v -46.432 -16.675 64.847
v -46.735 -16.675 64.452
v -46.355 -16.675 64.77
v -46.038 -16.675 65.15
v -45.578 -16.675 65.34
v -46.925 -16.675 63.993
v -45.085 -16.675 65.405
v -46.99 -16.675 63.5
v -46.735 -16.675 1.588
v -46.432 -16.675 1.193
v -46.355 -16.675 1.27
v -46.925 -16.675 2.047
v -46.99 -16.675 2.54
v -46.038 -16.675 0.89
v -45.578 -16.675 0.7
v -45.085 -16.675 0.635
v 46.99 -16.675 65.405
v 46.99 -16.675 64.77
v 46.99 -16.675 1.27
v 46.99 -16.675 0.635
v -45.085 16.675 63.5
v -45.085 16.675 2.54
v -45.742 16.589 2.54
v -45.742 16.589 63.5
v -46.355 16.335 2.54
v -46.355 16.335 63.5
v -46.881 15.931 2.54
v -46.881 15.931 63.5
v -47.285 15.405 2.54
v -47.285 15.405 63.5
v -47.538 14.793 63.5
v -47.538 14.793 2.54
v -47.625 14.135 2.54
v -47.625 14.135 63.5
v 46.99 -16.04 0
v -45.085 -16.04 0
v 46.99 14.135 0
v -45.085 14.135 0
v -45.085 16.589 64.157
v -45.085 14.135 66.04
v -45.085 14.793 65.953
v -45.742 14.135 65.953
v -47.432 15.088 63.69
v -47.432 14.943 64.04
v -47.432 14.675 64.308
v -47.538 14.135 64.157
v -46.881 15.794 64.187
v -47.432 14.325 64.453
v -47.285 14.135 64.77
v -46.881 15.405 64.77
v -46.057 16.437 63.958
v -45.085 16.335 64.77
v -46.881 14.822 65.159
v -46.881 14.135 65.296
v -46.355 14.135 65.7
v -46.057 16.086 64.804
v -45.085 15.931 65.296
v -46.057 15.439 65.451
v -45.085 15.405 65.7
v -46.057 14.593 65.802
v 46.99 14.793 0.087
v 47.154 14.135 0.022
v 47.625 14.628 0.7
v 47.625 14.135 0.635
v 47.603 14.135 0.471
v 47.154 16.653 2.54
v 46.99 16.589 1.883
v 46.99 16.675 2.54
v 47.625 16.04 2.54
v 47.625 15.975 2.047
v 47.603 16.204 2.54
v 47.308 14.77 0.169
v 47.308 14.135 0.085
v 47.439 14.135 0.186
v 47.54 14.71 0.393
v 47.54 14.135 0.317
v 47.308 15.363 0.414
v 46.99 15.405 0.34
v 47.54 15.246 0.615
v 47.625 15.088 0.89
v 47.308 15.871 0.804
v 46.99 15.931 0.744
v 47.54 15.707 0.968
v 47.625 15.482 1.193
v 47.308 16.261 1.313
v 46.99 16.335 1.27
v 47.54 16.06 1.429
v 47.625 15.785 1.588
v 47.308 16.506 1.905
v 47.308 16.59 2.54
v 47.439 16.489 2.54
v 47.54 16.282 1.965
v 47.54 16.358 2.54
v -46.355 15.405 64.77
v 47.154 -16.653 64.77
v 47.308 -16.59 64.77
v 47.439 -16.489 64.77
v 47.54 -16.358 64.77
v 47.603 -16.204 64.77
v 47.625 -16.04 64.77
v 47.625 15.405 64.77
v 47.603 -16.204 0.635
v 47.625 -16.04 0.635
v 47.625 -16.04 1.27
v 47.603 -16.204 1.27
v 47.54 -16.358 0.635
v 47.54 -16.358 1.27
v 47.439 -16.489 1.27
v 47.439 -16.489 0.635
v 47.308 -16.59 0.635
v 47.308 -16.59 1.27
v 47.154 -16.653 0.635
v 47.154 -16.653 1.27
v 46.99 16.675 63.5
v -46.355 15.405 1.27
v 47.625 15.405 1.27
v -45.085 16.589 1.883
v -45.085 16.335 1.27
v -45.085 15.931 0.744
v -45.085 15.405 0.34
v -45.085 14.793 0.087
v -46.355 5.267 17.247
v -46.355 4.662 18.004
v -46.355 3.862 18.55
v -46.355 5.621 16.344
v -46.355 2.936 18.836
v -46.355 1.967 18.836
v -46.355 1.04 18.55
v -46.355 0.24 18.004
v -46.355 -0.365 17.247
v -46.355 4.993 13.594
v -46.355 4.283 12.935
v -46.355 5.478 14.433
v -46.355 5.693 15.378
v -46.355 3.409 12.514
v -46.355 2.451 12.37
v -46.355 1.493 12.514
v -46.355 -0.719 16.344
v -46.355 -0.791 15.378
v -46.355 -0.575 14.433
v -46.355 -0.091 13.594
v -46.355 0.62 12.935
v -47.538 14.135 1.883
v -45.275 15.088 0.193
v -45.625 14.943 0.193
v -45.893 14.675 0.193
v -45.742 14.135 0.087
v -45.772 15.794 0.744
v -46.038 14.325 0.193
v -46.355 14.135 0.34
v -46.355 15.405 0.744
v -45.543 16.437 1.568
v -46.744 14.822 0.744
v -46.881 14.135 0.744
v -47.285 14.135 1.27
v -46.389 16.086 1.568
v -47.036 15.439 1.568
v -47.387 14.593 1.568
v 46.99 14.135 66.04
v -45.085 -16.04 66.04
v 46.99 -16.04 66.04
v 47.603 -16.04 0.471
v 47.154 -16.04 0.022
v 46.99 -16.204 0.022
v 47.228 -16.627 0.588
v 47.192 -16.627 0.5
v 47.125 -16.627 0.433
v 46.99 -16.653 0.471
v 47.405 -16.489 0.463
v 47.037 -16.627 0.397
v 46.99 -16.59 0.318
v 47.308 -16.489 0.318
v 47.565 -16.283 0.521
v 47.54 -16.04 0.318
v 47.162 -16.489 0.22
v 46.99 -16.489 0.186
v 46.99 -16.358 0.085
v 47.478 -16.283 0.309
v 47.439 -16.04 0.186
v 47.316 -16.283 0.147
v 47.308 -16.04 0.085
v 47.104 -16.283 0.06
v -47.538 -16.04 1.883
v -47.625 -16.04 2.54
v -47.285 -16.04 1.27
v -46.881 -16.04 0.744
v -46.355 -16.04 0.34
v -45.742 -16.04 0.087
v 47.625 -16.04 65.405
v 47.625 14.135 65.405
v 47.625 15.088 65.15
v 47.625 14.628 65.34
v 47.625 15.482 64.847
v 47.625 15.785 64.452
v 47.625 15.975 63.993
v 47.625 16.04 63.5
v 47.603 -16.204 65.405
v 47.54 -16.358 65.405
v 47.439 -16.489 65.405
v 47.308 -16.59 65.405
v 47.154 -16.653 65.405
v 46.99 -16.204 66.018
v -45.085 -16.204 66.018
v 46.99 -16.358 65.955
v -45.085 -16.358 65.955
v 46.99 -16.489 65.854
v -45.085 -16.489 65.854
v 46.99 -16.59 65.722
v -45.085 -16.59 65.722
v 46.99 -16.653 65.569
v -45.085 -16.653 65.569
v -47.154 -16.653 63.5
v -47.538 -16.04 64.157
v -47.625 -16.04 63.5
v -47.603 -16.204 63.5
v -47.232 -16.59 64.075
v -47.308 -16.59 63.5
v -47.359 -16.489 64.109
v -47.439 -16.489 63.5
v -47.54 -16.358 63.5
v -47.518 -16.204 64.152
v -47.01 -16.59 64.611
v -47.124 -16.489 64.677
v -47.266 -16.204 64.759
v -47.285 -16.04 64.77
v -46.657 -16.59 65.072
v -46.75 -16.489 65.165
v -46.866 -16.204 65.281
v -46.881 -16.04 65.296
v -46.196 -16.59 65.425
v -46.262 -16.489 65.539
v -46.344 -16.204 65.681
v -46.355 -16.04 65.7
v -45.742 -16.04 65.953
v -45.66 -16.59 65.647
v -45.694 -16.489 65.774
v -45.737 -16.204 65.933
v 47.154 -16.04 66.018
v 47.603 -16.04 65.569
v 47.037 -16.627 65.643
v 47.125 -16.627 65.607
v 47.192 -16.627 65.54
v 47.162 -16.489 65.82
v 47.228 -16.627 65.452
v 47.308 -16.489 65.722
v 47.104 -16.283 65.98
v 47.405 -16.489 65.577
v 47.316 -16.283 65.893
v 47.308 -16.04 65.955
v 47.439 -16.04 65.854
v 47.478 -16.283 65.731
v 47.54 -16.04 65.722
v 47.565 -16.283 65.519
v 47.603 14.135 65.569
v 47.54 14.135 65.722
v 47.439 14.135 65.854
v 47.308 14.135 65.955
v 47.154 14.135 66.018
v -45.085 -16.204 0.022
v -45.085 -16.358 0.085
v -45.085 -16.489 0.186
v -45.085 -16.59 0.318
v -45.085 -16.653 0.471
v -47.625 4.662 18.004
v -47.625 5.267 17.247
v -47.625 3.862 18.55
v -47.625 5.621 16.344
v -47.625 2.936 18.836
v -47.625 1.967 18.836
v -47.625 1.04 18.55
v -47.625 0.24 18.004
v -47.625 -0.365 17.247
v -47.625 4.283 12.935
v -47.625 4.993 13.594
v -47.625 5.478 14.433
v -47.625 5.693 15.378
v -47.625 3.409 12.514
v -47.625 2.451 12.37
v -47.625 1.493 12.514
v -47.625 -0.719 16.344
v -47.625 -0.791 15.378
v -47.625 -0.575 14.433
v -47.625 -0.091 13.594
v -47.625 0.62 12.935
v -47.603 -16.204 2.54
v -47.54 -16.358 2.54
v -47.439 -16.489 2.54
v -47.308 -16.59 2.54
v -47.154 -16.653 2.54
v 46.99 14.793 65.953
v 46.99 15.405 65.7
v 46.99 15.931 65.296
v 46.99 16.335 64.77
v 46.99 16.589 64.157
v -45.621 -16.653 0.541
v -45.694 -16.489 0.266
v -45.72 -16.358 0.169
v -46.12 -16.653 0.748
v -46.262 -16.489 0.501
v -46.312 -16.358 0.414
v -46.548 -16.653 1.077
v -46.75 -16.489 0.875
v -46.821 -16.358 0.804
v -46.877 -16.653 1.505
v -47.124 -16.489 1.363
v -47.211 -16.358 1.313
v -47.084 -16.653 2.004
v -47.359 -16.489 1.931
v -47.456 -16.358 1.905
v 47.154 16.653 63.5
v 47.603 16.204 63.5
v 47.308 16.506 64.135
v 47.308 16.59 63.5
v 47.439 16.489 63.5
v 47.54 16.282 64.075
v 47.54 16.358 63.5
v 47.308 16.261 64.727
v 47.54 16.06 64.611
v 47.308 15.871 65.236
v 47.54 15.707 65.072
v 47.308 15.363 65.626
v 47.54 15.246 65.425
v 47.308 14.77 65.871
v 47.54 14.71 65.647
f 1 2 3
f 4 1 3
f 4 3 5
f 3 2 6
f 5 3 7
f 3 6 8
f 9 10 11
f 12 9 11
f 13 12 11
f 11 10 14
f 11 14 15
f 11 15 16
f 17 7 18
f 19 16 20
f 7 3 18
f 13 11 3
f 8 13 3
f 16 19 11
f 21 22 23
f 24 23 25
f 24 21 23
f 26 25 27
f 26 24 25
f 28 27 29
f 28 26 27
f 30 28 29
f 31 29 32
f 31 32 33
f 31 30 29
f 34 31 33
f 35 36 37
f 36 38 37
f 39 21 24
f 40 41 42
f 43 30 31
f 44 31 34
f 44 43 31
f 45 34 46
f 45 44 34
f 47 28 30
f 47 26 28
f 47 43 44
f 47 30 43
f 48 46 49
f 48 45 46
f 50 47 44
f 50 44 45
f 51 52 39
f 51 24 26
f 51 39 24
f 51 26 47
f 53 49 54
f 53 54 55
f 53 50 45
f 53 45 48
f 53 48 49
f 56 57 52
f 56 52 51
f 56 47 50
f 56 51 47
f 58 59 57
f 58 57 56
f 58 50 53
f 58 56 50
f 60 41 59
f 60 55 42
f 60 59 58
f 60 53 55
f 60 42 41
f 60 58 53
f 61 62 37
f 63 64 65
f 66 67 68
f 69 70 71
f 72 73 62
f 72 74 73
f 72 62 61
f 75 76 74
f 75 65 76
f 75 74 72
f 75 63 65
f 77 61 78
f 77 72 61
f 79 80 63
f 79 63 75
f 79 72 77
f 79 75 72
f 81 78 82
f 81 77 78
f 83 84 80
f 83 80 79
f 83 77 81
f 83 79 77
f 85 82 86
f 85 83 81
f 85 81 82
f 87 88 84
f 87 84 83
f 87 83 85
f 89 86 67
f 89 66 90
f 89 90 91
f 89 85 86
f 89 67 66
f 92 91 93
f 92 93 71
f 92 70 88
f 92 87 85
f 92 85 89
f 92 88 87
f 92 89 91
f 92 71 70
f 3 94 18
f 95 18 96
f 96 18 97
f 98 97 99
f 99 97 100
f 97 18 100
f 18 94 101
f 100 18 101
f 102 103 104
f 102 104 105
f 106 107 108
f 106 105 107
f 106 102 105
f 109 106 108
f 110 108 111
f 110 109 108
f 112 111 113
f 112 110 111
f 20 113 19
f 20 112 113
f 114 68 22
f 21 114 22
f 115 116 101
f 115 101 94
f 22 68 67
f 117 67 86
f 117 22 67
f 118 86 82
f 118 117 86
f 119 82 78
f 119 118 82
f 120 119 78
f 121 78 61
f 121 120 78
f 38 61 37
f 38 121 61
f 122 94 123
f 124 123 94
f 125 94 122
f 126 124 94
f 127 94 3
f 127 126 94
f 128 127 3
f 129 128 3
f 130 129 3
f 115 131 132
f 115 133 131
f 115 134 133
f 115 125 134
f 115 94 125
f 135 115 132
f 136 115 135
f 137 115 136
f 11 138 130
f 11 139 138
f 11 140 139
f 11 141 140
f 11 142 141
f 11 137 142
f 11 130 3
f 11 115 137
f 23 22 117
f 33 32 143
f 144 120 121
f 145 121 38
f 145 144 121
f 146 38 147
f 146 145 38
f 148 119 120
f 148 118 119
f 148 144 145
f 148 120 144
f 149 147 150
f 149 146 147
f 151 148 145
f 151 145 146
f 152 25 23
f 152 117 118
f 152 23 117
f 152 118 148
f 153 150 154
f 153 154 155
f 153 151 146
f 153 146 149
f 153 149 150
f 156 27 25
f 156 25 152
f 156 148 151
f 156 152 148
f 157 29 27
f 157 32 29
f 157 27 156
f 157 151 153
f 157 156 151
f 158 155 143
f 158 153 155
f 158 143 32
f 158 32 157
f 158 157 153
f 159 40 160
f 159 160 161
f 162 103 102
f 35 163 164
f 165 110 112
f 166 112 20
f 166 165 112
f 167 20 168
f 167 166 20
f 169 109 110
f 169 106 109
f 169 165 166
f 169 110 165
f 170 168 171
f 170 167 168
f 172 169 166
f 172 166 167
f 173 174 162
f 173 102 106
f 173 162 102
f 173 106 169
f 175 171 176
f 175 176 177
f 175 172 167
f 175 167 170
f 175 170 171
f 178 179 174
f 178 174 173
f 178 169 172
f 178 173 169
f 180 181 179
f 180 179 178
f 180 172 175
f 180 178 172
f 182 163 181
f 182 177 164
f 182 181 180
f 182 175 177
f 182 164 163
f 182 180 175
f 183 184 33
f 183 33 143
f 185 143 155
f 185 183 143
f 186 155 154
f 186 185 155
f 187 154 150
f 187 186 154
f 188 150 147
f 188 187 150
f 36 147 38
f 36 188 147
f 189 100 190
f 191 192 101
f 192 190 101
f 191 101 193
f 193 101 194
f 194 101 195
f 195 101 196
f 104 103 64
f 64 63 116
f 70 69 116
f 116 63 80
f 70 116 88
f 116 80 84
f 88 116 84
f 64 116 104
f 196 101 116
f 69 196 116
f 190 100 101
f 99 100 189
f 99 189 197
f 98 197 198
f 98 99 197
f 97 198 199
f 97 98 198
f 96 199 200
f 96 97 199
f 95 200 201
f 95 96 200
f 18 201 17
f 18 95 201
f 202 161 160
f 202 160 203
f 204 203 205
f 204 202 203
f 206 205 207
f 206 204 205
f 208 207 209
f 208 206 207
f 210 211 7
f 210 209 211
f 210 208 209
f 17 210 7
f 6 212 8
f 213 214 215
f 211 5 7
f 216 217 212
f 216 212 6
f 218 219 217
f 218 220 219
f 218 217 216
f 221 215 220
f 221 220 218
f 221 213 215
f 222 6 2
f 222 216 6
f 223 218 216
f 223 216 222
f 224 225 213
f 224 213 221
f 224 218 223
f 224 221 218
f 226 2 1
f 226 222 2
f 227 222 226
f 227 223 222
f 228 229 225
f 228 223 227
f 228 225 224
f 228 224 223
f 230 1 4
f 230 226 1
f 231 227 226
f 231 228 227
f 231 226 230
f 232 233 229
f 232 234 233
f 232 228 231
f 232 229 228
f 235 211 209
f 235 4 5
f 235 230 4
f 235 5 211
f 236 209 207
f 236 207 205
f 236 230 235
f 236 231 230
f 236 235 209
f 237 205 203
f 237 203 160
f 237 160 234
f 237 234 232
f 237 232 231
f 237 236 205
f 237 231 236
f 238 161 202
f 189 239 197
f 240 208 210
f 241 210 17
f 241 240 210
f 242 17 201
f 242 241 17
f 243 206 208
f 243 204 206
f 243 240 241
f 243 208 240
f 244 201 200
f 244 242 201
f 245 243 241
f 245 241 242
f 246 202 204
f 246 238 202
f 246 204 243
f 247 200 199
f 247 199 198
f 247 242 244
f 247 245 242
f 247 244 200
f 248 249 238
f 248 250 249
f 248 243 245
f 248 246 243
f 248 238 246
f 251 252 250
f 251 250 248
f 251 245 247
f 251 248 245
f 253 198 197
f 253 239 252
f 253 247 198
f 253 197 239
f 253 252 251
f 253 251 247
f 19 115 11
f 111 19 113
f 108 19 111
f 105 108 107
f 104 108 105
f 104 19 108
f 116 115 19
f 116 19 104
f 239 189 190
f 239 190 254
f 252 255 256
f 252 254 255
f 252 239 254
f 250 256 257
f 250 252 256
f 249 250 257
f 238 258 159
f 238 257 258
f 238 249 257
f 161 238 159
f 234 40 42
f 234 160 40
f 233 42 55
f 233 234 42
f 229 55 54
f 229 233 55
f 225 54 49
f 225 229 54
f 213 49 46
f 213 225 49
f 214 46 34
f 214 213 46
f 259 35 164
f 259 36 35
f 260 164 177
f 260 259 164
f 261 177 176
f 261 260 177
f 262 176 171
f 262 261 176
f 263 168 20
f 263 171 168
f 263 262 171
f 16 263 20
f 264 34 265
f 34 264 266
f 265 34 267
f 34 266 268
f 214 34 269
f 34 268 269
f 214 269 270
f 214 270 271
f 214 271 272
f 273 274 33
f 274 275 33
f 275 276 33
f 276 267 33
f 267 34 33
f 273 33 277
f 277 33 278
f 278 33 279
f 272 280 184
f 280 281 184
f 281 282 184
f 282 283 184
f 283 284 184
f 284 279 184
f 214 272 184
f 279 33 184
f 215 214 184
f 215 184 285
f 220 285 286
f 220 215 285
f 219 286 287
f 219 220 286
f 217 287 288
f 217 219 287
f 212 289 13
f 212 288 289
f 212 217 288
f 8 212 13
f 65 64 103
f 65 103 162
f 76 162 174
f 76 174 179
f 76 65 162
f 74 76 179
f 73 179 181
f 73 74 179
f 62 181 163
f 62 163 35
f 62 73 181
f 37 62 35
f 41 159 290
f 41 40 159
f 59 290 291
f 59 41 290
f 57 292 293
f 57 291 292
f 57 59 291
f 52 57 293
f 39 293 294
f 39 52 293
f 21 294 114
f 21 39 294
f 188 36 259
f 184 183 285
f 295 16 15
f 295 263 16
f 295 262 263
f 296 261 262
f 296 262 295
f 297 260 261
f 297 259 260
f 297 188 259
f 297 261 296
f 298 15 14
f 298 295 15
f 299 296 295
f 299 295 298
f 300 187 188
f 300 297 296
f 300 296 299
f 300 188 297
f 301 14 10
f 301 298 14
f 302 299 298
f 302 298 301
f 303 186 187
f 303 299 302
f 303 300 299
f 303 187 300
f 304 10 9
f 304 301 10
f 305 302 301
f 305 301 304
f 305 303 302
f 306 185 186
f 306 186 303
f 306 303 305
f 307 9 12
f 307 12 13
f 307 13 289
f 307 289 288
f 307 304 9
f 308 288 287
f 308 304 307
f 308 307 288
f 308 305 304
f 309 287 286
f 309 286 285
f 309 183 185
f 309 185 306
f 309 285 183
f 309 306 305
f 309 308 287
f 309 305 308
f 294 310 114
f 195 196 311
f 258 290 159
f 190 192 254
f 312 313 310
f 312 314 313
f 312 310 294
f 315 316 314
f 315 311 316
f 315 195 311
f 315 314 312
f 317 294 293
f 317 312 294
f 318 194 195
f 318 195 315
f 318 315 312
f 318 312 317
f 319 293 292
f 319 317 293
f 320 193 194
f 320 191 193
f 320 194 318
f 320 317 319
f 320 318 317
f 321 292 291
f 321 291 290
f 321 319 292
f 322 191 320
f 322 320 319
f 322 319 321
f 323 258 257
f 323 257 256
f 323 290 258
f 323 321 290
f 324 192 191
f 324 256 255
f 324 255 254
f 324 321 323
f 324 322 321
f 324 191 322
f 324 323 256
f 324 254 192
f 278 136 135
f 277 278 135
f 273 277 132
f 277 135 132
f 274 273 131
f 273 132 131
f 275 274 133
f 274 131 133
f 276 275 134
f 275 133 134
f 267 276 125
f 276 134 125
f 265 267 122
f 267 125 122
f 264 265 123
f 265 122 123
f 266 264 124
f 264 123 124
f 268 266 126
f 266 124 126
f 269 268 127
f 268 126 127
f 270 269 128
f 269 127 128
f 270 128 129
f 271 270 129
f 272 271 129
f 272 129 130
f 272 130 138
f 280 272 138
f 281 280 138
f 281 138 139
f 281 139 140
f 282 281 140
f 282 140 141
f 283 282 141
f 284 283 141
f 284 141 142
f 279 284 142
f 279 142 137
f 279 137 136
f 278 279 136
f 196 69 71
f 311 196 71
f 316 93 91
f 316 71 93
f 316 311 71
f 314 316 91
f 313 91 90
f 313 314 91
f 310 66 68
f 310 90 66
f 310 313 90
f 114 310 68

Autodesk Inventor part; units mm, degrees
ref_plane "YZ Plane" through (0, 0, 0) normal (1, 0, 0) x (0, 1, 0)
ref_plane "XZ Plane" through (0, 0, 0) normal (0, 1, 0) x (-1, 0, 0)
ref_plane "XY Plane" through (0, 0, 0) normal (0, 0, 1) x (1, 0, 0)
sketch "Sketch1" plane through (0, 0, 0) normal (0, 0, 1) x (1, 0, 0)
  line L0 (-47.625, -16.6751) -> (47.625, -16.6751)
  line L1 (47.625, -16.6751) -> (47.625, 16.6751)
  line L2 (47.625, 16.6751) -> (-47.625, 16.6751)
  line L3 (-47.625, 16.6751) -> (-47.625, -16.6751)
  line L4 (-47.625, -16.6751) -> (47.625, 16.6751) construction
  line L5 (47.625, -16.6751) -> (-47.625, 16.6751) construction
  point P0 (0, 0)
  dimension "d0" = 95.25
  dimension "d1" = 33.3502
extrude "Extrusion1" add sketch "Sketch1" along normal blind 66.04
shell "Shell1" thickness 1.27 removed faces 2 at (-15.875, -16.6751, 44.0267) at (47.625, -5.5584, 44.0267)
sketch "Sketch2" plane through (-46.355, -16.6751, 1.27) normal (1, 0, 0) x (0, 0, -1)
  line L0 (0, 32.0802) -> (0, 0) projected
  line L1 (0, 0) -> (-63.5, 0) projected
  circle A0 centre (-14.351, 19.1262) radius 3.2512
  point P0 (1.27, 16.6751)
  dimension "d5" = 14.351
  dimension "d6" = 19.1262
  dimension "d7" = 6.5024
extrude "Extrusion2" cut sketch "Sketch2" against normal up to surface (1.27 mm away)
fillet "Fillet1" radius 2.54 5 edges at (0, 16.6751, 66.04) (-47.625, 16.6751, 33.02) (0, 16.6751, 0) (-47.625, 0, 0) (-47.625, 0, 66.04)
fillet "Fillet2" radius 0.635 5 edges at (47.625, -1.27, 0) (47.625, 15.9312, 0.7439) (47.625, 16.6751, 33.02) (47.625, 15.9312, 65.2961) (47.625, -1.27, 66.04)
fillet "Fillet3" radius 0.635 9 edges at (47.439, -16.6751, 65.854) (47.625, -16.6751, 65.0875) (-46.8811, -16.6751, 65.2961) (-47.625, -16.6751, 33.02) (-46.8811, -16.6751, 0.7439) (0.9525, -16.6751, 0) (47.439, -16.6751, 0.186) (47.625, -16.6751, 0.9525) (0.9525, -16.6751, 66.04)
properties part number "ECG_cover"
